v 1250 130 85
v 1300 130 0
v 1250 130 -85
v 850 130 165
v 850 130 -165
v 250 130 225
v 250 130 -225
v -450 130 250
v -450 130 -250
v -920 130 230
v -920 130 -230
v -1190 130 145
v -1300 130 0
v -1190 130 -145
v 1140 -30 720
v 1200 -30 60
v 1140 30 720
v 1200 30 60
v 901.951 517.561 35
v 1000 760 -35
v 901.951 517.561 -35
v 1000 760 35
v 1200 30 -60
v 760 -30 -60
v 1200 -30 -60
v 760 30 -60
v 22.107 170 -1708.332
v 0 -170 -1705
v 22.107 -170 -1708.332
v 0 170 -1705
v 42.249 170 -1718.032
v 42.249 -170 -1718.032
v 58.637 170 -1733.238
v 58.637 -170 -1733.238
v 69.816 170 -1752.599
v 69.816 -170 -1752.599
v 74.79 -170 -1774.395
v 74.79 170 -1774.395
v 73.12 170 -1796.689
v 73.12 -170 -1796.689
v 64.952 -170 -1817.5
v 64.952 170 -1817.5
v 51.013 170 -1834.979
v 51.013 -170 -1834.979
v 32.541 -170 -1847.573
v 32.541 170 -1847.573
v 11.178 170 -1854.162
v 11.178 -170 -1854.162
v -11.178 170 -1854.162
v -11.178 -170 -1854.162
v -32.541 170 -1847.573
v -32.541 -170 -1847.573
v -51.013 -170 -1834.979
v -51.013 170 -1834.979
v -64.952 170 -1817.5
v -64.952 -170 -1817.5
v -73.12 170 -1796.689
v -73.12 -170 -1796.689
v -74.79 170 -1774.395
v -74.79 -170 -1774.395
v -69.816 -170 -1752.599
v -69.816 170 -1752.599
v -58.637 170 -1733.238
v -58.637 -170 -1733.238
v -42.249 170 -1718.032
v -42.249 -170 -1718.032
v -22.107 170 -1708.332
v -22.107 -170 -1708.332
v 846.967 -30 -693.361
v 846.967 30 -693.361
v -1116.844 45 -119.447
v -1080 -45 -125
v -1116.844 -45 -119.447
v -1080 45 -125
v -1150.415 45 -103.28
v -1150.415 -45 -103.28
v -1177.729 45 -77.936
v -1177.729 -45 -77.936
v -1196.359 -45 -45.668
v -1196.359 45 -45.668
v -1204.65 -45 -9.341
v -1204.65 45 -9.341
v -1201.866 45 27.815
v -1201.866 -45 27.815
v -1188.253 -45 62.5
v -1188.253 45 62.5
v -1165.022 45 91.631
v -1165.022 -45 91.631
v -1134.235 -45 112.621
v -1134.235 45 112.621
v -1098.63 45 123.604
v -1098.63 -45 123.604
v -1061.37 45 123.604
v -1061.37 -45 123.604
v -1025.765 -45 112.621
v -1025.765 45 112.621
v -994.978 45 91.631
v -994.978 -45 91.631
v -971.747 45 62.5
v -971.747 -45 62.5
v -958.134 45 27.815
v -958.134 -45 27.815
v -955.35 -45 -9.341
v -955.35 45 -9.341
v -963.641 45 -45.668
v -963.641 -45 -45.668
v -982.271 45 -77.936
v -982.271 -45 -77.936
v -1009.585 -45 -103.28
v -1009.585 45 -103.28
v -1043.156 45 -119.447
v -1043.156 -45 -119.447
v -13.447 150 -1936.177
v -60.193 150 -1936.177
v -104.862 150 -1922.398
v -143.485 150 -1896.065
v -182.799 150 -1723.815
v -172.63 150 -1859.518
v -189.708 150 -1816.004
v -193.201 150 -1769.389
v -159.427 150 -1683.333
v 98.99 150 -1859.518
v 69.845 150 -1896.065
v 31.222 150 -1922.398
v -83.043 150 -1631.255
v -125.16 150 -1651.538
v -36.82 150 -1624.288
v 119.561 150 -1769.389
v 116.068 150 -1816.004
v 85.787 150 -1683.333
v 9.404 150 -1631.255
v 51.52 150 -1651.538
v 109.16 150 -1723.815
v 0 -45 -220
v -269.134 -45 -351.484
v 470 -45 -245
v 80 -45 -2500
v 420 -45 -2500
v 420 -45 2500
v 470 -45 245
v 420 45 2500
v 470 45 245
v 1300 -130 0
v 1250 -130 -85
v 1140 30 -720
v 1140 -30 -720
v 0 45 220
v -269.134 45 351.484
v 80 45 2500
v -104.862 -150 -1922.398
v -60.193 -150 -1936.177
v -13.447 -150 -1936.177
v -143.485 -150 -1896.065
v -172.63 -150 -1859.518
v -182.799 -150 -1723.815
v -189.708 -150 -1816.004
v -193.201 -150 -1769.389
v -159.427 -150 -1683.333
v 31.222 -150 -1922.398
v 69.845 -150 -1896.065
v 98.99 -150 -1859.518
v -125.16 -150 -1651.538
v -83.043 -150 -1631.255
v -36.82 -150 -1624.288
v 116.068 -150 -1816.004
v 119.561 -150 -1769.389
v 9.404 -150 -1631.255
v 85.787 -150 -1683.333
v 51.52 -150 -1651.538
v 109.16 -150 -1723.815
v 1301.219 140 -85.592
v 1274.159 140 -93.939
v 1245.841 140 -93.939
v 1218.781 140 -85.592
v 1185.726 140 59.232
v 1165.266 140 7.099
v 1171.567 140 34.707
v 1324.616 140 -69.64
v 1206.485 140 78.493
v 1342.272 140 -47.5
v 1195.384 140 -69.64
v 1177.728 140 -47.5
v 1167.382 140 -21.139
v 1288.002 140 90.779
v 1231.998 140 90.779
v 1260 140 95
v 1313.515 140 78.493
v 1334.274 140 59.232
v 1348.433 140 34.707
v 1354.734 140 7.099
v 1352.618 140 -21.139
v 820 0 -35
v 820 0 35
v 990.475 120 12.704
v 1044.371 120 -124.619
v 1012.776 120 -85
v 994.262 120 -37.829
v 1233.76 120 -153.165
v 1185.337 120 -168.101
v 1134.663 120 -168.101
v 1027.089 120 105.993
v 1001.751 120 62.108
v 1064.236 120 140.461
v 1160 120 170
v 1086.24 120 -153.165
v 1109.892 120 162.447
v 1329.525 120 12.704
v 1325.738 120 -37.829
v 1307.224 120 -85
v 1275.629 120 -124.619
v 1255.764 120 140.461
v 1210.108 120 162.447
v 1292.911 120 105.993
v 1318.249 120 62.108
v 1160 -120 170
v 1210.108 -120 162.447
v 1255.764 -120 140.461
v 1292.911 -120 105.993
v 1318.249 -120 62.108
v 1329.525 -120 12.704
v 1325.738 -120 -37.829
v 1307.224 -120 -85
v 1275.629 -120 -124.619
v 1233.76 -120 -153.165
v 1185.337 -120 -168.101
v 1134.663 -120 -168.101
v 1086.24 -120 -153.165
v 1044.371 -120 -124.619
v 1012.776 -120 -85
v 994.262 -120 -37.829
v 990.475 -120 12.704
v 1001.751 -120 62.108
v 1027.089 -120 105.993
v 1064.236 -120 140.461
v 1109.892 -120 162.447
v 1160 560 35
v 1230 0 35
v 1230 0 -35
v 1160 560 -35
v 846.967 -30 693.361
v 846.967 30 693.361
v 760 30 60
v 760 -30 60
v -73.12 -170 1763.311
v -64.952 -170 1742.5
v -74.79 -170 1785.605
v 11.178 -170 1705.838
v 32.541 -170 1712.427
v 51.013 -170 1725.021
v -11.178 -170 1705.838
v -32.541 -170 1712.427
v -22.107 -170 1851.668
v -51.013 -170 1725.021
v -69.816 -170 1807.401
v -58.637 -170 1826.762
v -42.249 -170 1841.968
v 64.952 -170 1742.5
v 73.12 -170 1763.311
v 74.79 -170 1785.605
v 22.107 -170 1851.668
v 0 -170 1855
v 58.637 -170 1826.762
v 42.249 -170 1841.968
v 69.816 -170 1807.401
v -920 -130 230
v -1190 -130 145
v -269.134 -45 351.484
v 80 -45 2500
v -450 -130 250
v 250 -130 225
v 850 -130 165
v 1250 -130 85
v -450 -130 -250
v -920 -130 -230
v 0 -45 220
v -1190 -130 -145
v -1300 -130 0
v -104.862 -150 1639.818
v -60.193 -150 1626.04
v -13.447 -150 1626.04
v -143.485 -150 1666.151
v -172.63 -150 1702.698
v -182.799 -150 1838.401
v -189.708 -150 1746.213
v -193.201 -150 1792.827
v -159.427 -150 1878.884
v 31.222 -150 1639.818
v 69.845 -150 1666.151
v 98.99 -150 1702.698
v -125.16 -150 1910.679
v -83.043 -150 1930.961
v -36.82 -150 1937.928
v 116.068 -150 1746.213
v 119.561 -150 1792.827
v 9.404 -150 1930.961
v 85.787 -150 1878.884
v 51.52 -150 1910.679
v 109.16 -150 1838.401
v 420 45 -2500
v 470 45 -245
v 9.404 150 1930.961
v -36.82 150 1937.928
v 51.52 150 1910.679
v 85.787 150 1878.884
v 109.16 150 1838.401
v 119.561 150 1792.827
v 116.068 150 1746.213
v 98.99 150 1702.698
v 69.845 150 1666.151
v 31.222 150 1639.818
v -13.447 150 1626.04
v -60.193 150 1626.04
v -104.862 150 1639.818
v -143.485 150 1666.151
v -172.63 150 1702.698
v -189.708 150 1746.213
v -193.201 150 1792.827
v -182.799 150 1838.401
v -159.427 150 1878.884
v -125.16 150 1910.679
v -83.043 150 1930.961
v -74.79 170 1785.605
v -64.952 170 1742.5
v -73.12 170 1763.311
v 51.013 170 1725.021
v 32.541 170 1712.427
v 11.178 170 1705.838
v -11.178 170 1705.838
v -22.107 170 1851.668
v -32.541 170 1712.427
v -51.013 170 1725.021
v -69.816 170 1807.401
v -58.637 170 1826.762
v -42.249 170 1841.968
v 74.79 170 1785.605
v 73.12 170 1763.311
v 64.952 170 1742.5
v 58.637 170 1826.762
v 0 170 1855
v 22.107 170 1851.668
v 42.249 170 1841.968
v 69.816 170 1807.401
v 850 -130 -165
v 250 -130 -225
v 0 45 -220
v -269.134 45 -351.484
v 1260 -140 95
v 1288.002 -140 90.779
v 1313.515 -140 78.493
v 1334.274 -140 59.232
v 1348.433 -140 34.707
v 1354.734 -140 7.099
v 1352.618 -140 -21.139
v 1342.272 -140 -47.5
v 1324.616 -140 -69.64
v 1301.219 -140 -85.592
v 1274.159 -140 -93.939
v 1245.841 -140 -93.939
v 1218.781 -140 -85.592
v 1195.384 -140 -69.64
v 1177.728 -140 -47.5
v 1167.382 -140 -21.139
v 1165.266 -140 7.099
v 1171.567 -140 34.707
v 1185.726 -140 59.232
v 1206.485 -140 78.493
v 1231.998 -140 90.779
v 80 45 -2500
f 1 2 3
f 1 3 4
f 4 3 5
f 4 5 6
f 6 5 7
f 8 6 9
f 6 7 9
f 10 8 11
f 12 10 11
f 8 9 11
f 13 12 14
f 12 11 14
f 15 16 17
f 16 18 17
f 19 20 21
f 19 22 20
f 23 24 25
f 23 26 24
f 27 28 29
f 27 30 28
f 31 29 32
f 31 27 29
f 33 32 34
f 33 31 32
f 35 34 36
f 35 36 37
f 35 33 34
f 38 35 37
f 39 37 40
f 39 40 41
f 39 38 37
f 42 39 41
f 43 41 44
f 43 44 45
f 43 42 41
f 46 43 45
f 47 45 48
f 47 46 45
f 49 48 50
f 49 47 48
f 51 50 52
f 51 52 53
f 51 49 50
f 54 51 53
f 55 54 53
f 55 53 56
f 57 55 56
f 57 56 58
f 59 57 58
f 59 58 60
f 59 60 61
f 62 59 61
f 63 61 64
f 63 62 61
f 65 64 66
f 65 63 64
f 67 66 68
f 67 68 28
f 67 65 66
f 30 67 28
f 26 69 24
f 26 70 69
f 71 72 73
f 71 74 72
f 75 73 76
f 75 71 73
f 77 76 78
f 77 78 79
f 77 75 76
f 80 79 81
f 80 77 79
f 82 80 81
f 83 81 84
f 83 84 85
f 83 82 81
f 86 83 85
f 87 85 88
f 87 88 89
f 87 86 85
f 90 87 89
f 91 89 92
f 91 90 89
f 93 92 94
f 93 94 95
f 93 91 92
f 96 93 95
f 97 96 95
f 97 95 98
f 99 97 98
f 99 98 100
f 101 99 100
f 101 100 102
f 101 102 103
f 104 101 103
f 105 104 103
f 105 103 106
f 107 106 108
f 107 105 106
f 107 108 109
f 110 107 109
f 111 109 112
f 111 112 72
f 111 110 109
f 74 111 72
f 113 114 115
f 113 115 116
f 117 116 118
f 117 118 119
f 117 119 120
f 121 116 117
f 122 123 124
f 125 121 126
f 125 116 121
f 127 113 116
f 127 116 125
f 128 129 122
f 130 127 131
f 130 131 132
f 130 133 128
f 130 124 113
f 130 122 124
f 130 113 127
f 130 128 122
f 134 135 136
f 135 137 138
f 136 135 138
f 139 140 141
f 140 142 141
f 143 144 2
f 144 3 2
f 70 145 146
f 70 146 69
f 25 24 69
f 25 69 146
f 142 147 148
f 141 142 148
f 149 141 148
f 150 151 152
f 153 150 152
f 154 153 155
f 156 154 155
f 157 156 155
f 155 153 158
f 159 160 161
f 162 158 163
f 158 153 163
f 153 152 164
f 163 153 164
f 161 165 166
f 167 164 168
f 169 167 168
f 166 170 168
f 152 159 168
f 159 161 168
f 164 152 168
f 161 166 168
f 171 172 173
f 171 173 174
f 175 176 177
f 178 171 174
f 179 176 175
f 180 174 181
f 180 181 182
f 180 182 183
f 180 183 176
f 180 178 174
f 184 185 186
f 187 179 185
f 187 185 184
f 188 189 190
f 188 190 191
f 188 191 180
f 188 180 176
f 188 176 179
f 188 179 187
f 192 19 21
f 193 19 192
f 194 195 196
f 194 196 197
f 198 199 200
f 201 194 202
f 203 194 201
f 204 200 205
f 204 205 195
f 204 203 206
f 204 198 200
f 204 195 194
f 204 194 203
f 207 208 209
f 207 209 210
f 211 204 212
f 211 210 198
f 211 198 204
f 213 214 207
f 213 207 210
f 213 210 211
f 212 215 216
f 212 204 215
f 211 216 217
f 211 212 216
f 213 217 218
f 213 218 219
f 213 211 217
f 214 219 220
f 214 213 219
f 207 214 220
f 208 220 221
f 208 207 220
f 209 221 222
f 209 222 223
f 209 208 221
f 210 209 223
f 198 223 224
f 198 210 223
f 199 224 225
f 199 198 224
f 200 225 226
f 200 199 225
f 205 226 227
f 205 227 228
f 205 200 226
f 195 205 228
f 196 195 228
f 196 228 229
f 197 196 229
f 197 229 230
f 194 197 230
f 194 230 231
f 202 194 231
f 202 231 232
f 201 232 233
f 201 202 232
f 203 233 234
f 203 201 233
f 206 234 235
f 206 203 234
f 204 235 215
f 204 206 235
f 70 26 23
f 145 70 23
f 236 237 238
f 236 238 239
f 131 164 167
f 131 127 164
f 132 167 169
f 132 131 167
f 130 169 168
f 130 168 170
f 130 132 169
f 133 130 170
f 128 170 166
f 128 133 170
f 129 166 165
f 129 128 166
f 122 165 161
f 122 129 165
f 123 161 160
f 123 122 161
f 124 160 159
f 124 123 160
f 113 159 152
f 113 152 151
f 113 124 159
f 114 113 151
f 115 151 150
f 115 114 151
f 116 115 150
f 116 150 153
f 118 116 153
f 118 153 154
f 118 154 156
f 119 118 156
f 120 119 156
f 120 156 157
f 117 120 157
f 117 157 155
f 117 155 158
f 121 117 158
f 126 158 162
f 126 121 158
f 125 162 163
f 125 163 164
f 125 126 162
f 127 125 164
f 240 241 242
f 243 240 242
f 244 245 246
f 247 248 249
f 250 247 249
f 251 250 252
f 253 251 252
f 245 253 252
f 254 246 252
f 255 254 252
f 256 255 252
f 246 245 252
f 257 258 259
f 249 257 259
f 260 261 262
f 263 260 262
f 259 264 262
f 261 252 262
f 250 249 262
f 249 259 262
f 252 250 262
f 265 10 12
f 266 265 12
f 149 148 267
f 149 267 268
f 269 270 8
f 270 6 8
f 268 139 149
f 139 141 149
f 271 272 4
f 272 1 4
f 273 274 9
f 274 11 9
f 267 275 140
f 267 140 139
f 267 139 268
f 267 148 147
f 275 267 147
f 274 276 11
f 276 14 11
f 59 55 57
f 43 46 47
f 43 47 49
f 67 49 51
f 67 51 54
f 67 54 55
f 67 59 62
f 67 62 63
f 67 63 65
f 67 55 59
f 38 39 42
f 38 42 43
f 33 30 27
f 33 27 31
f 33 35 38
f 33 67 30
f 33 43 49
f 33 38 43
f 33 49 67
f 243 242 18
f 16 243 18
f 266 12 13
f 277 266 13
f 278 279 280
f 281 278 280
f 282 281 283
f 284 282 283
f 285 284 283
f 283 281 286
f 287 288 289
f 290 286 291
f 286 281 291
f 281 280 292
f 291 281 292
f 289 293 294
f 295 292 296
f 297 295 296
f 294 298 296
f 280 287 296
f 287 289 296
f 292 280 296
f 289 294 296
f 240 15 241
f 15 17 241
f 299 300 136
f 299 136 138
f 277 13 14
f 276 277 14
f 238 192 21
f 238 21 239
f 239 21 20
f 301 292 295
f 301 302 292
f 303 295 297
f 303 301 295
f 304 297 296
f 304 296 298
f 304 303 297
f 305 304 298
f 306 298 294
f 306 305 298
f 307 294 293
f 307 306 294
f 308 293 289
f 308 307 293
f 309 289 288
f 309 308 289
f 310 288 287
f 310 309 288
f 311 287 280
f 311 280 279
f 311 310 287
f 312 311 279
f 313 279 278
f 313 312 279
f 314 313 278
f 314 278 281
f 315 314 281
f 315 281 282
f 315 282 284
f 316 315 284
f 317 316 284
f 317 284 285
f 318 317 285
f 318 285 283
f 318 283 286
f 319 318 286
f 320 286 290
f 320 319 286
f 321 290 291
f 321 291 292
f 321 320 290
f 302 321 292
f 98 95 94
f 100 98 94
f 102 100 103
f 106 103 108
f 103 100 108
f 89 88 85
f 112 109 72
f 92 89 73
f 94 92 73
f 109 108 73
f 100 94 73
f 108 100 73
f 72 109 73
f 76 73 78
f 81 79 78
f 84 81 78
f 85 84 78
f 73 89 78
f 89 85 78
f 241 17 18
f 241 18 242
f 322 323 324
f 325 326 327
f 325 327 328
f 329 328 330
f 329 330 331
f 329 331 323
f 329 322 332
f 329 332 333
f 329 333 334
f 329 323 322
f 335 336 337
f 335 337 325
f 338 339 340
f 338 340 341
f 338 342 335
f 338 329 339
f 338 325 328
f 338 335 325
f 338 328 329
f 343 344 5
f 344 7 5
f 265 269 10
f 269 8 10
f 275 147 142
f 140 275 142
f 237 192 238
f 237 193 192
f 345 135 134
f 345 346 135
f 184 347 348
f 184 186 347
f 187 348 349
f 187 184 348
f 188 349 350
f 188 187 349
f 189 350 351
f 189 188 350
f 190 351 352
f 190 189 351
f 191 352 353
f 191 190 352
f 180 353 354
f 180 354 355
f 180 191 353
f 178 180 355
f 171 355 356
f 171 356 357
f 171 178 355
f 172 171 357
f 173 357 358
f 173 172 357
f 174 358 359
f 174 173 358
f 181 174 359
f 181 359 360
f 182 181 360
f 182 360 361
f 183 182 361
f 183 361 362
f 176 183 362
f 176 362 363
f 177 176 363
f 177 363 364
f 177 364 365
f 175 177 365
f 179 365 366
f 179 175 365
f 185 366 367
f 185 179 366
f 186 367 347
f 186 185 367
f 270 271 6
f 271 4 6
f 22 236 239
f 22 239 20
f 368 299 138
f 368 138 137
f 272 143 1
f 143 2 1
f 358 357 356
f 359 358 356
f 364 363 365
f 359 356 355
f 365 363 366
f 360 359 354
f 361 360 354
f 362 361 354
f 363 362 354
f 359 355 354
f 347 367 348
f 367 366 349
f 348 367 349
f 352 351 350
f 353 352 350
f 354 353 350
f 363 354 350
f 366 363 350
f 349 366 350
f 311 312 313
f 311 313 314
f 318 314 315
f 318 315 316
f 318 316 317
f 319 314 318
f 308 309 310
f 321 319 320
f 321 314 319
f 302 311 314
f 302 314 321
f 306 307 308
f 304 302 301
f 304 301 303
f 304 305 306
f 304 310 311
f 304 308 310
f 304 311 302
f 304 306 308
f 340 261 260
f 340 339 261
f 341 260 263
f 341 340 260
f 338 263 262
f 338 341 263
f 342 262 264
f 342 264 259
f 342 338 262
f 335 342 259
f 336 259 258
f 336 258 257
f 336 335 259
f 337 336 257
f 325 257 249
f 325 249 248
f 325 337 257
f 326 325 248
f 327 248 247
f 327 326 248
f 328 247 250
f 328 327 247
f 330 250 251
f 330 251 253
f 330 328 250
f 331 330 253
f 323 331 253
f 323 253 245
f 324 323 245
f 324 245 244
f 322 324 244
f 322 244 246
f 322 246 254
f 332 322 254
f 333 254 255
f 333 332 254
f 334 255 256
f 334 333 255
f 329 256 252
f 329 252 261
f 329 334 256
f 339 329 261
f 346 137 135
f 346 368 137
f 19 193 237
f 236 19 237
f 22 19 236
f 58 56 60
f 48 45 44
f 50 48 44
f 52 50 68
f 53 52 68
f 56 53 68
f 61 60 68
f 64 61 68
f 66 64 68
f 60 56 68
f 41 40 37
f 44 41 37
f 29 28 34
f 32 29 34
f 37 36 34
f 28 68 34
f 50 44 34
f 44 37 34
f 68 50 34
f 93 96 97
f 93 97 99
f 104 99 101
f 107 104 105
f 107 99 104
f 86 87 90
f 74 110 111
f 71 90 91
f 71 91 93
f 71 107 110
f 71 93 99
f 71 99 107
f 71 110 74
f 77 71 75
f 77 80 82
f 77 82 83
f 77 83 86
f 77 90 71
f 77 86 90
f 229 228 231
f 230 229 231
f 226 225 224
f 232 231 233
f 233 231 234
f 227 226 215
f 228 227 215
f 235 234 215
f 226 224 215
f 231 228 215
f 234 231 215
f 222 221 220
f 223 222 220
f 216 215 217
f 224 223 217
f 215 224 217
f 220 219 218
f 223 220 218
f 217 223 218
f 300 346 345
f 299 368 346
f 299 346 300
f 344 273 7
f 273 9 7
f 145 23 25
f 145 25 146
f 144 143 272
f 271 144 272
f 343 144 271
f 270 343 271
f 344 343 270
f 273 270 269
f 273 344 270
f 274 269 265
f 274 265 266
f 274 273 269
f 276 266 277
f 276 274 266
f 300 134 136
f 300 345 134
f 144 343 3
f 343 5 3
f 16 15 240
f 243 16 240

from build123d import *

# Parameters (mm, degrees)
BOSS_EXTRUDE1_DEPTH  = 130
BOSS_EXTRUDE2_DEPTH  = 45
BOSS_EXTRUDE3_DEPTH  = 45
BOSS_EXTRUDE4_DEPTH  = 30
BOSS_EXTRUDE5_DEPTH  = 30
BOSS_EXTRUDE6_DEPTH  = 35
SKETCH7_R            = 156.819911707
BOSS_EXTRUDE7_DEPTH  = 150
SKETCH8_R            = 156.819911707
BOSS_EXTRUDE8_DEPTH  = 150
SKETCH9_R            = 170
BOSS_EXTRUDE9_DEPTH  = 120
SKETCH10_R           = 75
BOSS_EXTRUDE10_DEPTH = 170
SKETCH11_R           = 75
BOSS_EXTRUDE11_DEPTH = 170
SKETCH12_R           = 95
BOSS_EXTRUDE12_DEPTH = 140
SKETCH13_R           = 125
BOSS_EXTRUDE13_DEPTH = 45


with BuildPart() as part:
    # Sketch1 → Boss-Extrude1 (new, symmetric)
    with BuildSketch(Plane(origin=(0, 0, 0), x_dir=(1, 0, 0), z_dir=(0, 1, 0))):
        Polygon((-1300, 0), (-1190, 145), (-920, 230), (-450, 250), (250, 225), (850, 165), (1250, 85), (1300, 0), (1250, -85), (850, -165), (250, -225), (-450, -250), (-920, -230), (-1190, -145), align=None)
    extrude(amount=BOSS_EXTRUDE1_DEPTH, both=True)


with BuildPart() as body_2:
    # Sketch2 → Boss-Extrude2 (new, symmetric)
    with BuildSketch(Plane(origin=(0, 0, 0), x_dir=(1, 0, 0), z_dir=(0, 1, 0))):
        Polygon((0, 220), (470, 245), (420, 2500), (80, 2500), (-180, 900), (-269.133810321, 351.484244177), align=None)
    extrude(amount=BOSS_EXTRUDE2_DEPTH, both=True)


with BuildPart() as body_3:
    # Sketch3 → Boss-Extrude3 (new, symmetric)
    with BuildSketch(Plane(origin=(0, 0, 0), x_dir=(1, 0, 0), z_dir=(0, 1, 0))):
        Polygon((0, -220), (470, -245), (420, -2500), (80, -2500), (-180, -900), (-269.133810321, -351.484244177), align=None)
    extrude(amount=BOSS_EXTRUDE3_DEPTH, both=True)


with BuildPart() as body_4:
    # Sketch4 → Boss-Extrude4 (new, symmetric)
    with BuildSketch(Plane(origin=(0, 0, 0), x_dir=(1, 0, 0), z_dir=(0, 1, 0))):
        Polygon((760, 60), (1200, 60), (1140, 720), (846.967213115, 693.360655738), align=None)
    extrude(amount=BOSS_EXTRUDE4_DEPTH, both=True)


with BuildPart() as body_5:
    # Sketch5 → Boss-Extrude5 (new, symmetric)
    with BuildSketch(Plane(origin=(0, 0, 0), x_dir=(1, 0, 0), z_dir=(0, 1, 0))):
        Polygon((760, -60), (1200, -60), (1140, -720), (846.967213115, -693.360655738), align=None)
    extrude(amount=BOSS_EXTRUDE5_DEPTH, both=True)


with BuildPart() as body_6:
    # Sketch6 → Boss-Extrude6 (new, symmetric)
    with BuildSketch(Plane.XY):
        Polygon((820, 0), (1230, 0), (1160, 560), (1000, 760), (901.951219512, 517.56097561), align=None)
    extrude(amount=BOSS_EXTRUDE6_DEPTH, both=True)


with BuildPart() as body_7:
    # Sketch7 → Boss-Extrude7 (new, symmetric)
    with BuildSketch(Plane(origin=(0, 0, 0), x_dir=(1, 0, 0), z_dir=(0, 1, 0))):
        with Locations(Location((-36.819911707, 1781.108235652, 0), (0, 0, 270))):
            Circle(SKETCH7_R)
    extrude(amount=BOSS_EXTRUDE7_DEPTH, both=True)


with BuildPart() as body_8:
    # Sketch8 → Boss-Extrude8 (new, symmetric)
    with BuildSketch(Plane(origin=(0, 0, 0), x_dir=(1, 0, 0), z_dir=(0, 1, 0))):
        with Locations(Location((-36.819911707, -1781.108235652, 0), (0, 0, 270))):
            Circle(SKETCH8_R)
    extrude(amount=BOSS_EXTRUDE8_DEPTH, both=True)


with BuildPart() as body_9:
    # Sketch9 → Boss-Extrude9 (new, symmetric)
    with BuildSketch(Plane(origin=(0, 0, 0), x_dir=(1, 0, 0), z_dir=(0, 1, 0))):
        with Locations(Location((1160, 0, 0), (0, 0, 270))):
            Circle(SKETCH9_R)
    extrude(amount=BOSS_EXTRUDE9_DEPTH, both=True)


with BuildPart() as body_10:
    # Sketch10 → Boss-Extrude10 (new, symmetric)
    with BuildSketch(Plane(origin=(0, 0, 0), x_dir=(1, 0, 0), z_dir=(0, 1, 0))):
        with Locations(Location((0, 1780, 0), (0, 0, 270))):
            Circle(SKETCH10_R)
    extrude(amount=BOSS_EXTRUDE10_DEPTH, both=True)


with BuildPart() as body_11:
    # Sketch11 → Boss-Extrude11 (new, symmetric)
    with BuildSketch(Plane(origin=(0, 0, 0), x_dir=(1, 0, 0), z_dir=(0, 1, 0))):
        with Locations(Location((0, -1780, 0), (0, 0, 270))):
            Circle(SKETCH11_R)
    extrude(amount=BOSS_EXTRUDE11_DEPTH, both=True)


with BuildPart() as body_12:
    # Sketch12 → Boss-Extrude12 (new, symmetric)
    with BuildSketch(Plane(origin=(0, 0, 0), x_dir=(1, 0, 0), z_dir=(0, 1, 0))):
        with Locations(Location((1260, 0, 0), (0, 0, 270))):
            Circle(SKETCH12_R)
    extrude(amount=BOSS_EXTRUDE12_DEPTH, both=True)


with BuildPart() as body_13:
    # Sketch13 → Boss-Extrude13 (new, symmetric)
    with BuildSketch(Plane(origin=(0, 0, 0), x_dir=(1, 0, 0), z_dir=(0, 1, 0))):
        with Locations(Location((-1080, 0, 0), (0, 0, 90))):
            Circle(SKETCH13_R)
    extrude(amount=BOSS_EXTRUDE13_DEPTH, both=True)


solid = Compound([part.part, body_2.part, body_3.part, body_4.part, body_5.part, body_6.part, body_7.part, body_8.part, body_9.part, body_10.part, body_11.part, body_12.part, body_13.part])
